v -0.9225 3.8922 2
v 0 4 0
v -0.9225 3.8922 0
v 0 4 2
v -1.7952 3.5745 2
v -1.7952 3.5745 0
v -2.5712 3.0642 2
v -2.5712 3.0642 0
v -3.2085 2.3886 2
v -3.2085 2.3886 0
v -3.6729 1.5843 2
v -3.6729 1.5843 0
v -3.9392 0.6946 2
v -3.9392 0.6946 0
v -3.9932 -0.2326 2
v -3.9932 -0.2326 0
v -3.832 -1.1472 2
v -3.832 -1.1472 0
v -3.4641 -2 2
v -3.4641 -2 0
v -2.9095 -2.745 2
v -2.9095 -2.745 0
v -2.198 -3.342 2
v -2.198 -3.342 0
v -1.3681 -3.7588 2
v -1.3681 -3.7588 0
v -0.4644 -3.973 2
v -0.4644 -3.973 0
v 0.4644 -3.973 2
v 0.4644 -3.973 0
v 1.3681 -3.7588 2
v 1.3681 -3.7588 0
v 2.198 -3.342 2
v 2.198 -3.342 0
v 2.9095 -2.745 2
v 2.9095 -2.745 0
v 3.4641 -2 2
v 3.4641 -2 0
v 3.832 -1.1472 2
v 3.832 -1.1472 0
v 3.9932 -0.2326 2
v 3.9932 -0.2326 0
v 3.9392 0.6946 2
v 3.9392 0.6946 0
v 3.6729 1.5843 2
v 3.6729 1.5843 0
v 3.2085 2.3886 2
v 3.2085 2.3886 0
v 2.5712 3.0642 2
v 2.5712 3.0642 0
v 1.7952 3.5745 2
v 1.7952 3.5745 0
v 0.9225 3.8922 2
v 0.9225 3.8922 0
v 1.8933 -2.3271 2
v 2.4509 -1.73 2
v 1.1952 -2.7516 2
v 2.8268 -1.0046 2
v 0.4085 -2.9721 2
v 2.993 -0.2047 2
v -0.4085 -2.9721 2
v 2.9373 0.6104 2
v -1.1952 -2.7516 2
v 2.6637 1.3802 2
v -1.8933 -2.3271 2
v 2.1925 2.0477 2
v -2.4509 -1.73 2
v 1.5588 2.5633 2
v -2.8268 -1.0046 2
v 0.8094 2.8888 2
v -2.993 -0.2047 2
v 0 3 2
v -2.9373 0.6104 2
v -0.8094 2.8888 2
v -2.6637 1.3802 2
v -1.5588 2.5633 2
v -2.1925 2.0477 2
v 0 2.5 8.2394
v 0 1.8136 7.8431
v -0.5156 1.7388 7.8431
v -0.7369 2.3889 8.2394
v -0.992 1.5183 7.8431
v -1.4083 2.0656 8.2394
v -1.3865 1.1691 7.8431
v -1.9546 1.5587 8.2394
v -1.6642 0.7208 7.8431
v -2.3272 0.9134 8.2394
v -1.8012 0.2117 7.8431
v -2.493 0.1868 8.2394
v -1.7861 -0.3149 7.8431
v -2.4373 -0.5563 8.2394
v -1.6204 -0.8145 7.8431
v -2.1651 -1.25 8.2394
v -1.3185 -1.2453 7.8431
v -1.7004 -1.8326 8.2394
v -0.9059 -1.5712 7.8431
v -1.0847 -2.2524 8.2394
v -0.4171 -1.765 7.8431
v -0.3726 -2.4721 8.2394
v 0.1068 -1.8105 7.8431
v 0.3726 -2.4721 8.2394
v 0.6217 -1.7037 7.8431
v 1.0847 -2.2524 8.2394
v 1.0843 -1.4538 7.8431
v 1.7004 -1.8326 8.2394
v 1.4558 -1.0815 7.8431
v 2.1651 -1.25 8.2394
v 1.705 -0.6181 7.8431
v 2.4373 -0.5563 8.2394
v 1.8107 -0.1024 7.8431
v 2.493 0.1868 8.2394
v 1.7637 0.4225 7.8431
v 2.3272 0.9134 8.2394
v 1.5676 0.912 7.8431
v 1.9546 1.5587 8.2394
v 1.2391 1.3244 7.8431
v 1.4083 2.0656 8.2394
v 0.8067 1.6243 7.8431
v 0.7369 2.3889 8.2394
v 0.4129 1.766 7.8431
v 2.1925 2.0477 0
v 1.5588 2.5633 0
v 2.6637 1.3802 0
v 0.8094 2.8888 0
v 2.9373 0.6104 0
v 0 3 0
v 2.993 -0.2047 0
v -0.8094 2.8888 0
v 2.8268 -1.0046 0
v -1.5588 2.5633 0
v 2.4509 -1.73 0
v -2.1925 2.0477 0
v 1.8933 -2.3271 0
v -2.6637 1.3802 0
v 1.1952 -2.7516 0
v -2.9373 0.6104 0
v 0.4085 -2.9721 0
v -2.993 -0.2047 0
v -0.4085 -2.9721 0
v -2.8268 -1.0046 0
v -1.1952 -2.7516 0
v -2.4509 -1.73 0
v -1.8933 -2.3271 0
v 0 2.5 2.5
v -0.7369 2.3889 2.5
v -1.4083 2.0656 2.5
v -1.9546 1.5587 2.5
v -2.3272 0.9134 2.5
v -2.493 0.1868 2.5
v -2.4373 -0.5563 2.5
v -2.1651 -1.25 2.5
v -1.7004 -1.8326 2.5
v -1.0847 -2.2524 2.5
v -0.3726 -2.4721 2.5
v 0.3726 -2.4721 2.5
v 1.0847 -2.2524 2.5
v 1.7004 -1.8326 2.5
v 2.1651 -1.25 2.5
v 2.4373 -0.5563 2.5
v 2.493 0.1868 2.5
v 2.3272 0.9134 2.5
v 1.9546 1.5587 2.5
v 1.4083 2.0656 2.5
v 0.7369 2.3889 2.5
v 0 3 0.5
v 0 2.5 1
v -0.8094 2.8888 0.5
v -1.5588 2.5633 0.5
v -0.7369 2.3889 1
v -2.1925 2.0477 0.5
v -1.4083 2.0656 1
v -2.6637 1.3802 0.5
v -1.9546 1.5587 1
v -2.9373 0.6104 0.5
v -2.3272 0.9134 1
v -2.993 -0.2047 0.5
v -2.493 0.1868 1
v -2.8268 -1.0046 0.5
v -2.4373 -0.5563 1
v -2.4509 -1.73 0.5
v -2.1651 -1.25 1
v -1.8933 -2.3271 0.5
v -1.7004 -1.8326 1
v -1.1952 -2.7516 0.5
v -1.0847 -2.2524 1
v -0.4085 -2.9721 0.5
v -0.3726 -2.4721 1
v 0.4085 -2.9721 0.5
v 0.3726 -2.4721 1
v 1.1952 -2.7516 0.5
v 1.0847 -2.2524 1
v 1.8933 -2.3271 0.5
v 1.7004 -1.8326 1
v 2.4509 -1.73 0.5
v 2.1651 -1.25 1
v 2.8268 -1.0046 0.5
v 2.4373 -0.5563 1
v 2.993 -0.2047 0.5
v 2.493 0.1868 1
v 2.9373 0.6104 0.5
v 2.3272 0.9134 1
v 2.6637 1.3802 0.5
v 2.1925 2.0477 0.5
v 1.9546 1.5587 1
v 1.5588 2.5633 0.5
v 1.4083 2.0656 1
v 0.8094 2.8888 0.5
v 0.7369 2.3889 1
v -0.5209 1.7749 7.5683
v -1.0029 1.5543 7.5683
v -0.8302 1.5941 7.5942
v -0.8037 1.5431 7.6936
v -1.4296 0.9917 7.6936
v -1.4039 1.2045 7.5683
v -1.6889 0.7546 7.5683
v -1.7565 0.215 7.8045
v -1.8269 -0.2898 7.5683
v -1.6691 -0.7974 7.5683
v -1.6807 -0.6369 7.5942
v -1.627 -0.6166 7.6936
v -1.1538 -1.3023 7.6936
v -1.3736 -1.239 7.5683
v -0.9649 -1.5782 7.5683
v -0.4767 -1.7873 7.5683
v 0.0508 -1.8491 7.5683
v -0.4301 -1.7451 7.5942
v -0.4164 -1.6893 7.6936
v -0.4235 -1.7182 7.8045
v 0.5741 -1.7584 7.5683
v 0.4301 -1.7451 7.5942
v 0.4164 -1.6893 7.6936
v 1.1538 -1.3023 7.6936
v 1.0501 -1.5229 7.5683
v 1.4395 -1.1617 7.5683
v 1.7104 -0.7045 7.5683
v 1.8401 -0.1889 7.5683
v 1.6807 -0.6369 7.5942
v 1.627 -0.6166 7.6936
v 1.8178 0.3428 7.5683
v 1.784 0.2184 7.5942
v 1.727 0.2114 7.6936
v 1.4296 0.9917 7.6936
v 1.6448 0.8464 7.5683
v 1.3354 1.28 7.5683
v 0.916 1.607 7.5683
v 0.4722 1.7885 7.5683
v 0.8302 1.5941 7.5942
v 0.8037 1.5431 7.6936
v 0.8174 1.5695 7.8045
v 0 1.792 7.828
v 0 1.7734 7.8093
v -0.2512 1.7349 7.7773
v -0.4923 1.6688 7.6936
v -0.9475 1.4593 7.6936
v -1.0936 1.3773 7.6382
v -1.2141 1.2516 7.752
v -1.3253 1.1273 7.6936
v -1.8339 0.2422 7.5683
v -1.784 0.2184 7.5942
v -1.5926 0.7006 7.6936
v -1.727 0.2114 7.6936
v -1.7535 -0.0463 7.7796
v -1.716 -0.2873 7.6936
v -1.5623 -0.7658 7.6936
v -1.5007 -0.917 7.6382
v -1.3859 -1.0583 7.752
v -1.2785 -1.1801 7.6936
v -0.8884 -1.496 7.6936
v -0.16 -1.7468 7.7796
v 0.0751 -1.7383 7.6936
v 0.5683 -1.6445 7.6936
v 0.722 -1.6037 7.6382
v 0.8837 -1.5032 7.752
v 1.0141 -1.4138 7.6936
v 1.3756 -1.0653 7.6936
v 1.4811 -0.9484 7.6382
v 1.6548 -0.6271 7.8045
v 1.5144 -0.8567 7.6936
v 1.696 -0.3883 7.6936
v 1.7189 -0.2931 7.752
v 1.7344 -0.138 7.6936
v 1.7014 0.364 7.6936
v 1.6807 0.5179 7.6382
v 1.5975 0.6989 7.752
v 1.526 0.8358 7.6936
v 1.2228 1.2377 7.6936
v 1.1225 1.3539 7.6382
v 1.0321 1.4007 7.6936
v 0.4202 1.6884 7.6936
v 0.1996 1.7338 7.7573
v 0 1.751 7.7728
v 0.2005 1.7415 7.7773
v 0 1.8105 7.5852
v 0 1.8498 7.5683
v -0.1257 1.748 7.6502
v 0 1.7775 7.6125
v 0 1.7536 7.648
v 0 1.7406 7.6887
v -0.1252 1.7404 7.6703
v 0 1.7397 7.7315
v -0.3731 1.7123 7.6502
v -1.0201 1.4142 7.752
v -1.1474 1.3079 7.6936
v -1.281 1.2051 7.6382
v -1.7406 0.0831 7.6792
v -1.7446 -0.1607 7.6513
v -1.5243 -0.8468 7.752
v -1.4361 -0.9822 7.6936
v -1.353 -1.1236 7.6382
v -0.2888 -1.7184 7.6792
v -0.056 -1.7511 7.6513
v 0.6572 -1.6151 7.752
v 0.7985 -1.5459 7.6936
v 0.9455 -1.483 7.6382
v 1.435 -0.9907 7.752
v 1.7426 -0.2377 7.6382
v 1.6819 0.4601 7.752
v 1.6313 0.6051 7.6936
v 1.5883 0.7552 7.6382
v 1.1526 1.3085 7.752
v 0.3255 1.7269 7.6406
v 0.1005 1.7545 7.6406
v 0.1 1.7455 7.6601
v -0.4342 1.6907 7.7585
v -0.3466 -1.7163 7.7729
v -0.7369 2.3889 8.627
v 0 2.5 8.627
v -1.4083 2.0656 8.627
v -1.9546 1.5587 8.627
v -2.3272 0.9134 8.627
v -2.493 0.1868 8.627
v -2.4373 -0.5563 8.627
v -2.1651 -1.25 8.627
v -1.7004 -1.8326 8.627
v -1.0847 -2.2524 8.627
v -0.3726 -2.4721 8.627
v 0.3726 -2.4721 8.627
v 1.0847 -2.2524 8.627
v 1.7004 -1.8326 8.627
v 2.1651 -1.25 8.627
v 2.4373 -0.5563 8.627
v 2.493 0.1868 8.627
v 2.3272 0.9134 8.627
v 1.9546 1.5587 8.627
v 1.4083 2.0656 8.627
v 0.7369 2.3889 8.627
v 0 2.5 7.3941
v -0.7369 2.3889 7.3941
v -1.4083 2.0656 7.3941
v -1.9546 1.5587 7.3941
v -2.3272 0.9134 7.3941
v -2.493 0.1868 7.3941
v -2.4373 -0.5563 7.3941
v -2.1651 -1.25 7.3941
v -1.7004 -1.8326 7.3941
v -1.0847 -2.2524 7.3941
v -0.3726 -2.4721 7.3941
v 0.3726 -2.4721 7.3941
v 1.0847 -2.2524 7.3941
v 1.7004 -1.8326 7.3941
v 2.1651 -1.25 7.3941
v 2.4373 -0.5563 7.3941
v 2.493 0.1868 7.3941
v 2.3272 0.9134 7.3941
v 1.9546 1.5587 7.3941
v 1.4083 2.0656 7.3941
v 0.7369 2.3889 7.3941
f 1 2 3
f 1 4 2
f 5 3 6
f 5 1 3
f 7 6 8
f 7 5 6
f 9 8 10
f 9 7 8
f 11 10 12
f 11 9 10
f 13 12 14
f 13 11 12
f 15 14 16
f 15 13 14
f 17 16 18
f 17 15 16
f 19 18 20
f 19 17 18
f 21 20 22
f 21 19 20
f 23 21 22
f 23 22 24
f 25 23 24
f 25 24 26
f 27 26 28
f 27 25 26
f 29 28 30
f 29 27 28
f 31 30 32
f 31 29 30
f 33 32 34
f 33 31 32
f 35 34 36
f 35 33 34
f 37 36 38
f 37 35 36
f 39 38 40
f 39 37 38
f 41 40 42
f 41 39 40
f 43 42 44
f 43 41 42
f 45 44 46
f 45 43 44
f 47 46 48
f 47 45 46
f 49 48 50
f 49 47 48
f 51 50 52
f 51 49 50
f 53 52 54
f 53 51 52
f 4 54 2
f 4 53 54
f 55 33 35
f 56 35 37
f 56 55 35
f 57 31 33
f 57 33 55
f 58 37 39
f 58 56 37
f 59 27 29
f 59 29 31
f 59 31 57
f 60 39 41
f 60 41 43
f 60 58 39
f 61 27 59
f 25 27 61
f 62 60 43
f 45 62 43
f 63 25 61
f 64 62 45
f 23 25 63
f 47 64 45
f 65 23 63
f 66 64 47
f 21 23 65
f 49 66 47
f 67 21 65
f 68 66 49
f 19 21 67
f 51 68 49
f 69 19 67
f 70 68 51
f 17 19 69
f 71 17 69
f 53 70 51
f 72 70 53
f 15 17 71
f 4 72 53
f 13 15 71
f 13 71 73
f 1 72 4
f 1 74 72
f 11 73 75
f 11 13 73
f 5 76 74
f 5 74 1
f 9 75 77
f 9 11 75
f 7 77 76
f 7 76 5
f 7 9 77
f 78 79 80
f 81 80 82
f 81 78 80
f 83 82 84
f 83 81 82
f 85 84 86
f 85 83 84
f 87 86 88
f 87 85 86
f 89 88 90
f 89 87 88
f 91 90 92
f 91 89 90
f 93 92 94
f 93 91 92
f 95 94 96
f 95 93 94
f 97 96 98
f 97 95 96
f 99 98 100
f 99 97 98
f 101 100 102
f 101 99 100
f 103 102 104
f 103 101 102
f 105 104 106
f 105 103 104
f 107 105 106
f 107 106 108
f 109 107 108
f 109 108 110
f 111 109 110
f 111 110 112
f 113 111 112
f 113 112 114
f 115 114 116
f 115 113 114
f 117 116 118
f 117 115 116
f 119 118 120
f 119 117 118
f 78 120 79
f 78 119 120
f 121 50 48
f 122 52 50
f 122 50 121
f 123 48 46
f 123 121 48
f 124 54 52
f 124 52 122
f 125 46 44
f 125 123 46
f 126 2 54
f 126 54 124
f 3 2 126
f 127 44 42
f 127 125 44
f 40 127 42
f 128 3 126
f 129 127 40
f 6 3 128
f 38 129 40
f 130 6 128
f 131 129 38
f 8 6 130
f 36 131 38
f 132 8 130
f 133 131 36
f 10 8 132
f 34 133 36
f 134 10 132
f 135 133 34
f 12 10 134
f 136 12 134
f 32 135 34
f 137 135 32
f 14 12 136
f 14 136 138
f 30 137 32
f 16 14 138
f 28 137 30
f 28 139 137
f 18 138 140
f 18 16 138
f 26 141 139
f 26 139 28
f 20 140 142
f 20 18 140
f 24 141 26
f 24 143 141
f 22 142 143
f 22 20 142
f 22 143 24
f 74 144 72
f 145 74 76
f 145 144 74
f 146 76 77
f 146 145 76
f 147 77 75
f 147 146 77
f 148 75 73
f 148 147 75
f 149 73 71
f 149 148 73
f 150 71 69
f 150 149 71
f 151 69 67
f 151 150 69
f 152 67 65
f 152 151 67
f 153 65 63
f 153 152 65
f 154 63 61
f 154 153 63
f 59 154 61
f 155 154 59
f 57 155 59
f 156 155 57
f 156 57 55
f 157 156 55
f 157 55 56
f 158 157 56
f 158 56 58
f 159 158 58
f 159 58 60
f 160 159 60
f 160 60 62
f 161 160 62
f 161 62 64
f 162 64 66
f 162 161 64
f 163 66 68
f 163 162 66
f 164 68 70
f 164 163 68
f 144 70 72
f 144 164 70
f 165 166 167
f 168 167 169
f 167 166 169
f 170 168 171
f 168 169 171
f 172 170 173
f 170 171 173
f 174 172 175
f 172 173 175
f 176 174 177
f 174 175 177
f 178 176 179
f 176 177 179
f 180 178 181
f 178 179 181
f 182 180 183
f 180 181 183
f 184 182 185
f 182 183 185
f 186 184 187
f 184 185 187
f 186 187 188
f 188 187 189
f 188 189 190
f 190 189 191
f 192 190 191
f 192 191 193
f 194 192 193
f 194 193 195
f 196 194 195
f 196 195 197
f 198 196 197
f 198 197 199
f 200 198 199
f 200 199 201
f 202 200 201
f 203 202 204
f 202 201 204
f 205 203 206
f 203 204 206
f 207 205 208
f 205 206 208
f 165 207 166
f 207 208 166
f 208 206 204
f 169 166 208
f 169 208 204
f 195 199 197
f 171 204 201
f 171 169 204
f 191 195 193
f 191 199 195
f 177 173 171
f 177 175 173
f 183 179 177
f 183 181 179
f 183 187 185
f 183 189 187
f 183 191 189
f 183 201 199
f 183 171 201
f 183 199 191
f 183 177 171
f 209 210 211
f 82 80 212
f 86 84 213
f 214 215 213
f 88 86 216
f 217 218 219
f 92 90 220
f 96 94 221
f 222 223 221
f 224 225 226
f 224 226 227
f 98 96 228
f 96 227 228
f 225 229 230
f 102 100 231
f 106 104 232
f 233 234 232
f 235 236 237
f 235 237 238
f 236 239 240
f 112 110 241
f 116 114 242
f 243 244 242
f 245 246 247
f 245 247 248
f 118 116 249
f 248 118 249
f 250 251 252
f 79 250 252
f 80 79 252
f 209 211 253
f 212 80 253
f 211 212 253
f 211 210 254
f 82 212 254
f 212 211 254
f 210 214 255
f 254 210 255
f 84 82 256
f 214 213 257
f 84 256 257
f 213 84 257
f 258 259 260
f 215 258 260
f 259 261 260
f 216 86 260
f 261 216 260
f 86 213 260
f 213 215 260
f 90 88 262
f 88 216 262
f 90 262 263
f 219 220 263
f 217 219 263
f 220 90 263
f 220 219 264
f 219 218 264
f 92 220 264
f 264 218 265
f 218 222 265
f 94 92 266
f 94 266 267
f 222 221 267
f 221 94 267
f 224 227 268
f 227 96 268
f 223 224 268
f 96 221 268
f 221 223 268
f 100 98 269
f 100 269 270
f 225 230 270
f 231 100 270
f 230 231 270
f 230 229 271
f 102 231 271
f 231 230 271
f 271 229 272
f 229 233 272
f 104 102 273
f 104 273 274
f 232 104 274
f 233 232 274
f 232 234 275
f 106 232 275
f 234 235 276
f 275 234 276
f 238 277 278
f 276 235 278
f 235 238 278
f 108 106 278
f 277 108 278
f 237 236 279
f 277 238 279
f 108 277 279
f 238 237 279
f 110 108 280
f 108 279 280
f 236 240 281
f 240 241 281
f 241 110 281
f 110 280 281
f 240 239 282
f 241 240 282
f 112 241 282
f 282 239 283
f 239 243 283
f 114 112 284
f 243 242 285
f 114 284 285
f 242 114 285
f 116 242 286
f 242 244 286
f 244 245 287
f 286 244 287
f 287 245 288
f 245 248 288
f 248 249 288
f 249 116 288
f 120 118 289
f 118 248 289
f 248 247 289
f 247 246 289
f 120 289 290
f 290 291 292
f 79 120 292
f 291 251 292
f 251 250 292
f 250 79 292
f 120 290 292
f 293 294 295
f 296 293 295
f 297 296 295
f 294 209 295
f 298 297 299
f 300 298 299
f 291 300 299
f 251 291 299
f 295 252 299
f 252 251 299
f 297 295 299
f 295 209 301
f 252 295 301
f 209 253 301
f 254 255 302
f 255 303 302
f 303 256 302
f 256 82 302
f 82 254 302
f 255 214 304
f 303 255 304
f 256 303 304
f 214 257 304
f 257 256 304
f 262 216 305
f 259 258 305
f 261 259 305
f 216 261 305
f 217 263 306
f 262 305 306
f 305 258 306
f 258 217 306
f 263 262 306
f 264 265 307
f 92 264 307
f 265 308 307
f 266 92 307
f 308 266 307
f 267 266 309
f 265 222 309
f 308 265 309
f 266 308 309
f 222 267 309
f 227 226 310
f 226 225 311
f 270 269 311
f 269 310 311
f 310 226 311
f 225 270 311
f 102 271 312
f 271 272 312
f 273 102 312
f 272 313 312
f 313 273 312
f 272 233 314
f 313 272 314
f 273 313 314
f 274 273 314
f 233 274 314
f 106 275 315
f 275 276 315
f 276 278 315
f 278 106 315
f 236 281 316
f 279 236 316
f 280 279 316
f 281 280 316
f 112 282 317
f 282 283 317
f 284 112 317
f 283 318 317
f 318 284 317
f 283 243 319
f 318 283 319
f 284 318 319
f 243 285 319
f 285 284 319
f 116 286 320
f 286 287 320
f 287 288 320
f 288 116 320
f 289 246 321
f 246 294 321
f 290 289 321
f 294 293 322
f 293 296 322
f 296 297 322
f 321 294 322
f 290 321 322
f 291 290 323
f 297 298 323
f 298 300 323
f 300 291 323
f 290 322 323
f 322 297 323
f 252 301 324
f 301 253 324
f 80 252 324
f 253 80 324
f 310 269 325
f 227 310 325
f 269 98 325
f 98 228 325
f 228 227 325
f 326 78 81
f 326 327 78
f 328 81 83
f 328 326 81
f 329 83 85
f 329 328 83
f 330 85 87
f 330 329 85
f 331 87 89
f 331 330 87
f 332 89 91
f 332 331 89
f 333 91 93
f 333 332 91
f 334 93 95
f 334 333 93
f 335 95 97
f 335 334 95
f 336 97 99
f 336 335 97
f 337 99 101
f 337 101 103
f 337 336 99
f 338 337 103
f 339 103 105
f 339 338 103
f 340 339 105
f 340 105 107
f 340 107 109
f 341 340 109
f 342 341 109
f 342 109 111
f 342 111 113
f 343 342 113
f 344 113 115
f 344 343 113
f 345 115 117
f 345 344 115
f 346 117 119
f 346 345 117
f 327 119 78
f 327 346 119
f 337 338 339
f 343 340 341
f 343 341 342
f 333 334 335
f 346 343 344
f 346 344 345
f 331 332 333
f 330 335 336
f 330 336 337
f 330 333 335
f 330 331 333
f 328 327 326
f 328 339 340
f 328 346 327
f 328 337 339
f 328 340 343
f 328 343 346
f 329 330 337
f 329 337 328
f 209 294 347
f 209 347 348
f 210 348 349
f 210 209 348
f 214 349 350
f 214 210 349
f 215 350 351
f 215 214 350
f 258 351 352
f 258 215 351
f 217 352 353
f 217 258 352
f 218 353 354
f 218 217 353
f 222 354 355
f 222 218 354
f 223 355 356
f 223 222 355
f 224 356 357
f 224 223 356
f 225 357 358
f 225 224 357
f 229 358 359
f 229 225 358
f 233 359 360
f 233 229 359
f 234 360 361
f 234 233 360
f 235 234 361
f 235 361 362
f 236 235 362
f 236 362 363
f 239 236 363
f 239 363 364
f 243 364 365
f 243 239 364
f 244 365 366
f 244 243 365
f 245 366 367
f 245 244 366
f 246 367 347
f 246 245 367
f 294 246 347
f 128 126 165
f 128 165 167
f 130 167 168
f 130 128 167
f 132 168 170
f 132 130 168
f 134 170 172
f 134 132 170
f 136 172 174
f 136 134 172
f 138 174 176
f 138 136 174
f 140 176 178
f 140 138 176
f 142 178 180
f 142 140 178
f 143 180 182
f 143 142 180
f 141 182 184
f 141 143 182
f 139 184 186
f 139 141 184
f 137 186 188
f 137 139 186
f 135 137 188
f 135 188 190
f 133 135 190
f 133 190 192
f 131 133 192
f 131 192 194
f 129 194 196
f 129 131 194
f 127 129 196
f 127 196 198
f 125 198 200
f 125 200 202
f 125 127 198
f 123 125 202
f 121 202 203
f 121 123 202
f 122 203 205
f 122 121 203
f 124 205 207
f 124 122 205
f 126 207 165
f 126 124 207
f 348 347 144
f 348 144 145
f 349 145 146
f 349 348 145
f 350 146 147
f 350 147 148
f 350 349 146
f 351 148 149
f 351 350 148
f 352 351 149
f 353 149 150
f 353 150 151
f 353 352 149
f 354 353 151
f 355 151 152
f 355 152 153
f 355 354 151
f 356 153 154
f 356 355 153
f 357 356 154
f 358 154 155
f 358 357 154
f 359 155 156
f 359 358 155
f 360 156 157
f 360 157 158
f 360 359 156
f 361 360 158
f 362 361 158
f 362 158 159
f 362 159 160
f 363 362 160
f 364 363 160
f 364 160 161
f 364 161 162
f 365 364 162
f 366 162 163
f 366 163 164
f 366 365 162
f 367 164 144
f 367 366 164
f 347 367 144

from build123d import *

# Parameters (mm, degrees)
F2_SIZE = 0.5
F3_R    = 0.15


with BuildPart() as f1:
    # F0 (on Right) → F1 (revolve)
    with BuildSketch(Plane.YZ):
        Polygon((3, 1), (3, 0), (4, 0), (4, 2), (2.5, 2), (2.5, 7.394109), (1.5, 7.662058), (2.5, 8.239408), (2.5, 8.627035), (0, 8.627035), (0, 1), align=None)
    revolve(axis=Axis((0, 0, 18.218487), (0, 0, 1)))

    # F2
    f2_edges = [f1.edges().sort_by_distance(p)[0] for p in [
        (0, -2.5, 2),
        (0, -3, 1),
    ]]
    chamfer(f2_edges, length=F2_SIZE)

    # F3
    f3_edges = [f1.edges().sort_by_distance(p)[0] for p in [
        (0, -1.5, 7.662058),
    ]]
    fillet(f3_edges, radius=F3_R)


solid = f1.part
